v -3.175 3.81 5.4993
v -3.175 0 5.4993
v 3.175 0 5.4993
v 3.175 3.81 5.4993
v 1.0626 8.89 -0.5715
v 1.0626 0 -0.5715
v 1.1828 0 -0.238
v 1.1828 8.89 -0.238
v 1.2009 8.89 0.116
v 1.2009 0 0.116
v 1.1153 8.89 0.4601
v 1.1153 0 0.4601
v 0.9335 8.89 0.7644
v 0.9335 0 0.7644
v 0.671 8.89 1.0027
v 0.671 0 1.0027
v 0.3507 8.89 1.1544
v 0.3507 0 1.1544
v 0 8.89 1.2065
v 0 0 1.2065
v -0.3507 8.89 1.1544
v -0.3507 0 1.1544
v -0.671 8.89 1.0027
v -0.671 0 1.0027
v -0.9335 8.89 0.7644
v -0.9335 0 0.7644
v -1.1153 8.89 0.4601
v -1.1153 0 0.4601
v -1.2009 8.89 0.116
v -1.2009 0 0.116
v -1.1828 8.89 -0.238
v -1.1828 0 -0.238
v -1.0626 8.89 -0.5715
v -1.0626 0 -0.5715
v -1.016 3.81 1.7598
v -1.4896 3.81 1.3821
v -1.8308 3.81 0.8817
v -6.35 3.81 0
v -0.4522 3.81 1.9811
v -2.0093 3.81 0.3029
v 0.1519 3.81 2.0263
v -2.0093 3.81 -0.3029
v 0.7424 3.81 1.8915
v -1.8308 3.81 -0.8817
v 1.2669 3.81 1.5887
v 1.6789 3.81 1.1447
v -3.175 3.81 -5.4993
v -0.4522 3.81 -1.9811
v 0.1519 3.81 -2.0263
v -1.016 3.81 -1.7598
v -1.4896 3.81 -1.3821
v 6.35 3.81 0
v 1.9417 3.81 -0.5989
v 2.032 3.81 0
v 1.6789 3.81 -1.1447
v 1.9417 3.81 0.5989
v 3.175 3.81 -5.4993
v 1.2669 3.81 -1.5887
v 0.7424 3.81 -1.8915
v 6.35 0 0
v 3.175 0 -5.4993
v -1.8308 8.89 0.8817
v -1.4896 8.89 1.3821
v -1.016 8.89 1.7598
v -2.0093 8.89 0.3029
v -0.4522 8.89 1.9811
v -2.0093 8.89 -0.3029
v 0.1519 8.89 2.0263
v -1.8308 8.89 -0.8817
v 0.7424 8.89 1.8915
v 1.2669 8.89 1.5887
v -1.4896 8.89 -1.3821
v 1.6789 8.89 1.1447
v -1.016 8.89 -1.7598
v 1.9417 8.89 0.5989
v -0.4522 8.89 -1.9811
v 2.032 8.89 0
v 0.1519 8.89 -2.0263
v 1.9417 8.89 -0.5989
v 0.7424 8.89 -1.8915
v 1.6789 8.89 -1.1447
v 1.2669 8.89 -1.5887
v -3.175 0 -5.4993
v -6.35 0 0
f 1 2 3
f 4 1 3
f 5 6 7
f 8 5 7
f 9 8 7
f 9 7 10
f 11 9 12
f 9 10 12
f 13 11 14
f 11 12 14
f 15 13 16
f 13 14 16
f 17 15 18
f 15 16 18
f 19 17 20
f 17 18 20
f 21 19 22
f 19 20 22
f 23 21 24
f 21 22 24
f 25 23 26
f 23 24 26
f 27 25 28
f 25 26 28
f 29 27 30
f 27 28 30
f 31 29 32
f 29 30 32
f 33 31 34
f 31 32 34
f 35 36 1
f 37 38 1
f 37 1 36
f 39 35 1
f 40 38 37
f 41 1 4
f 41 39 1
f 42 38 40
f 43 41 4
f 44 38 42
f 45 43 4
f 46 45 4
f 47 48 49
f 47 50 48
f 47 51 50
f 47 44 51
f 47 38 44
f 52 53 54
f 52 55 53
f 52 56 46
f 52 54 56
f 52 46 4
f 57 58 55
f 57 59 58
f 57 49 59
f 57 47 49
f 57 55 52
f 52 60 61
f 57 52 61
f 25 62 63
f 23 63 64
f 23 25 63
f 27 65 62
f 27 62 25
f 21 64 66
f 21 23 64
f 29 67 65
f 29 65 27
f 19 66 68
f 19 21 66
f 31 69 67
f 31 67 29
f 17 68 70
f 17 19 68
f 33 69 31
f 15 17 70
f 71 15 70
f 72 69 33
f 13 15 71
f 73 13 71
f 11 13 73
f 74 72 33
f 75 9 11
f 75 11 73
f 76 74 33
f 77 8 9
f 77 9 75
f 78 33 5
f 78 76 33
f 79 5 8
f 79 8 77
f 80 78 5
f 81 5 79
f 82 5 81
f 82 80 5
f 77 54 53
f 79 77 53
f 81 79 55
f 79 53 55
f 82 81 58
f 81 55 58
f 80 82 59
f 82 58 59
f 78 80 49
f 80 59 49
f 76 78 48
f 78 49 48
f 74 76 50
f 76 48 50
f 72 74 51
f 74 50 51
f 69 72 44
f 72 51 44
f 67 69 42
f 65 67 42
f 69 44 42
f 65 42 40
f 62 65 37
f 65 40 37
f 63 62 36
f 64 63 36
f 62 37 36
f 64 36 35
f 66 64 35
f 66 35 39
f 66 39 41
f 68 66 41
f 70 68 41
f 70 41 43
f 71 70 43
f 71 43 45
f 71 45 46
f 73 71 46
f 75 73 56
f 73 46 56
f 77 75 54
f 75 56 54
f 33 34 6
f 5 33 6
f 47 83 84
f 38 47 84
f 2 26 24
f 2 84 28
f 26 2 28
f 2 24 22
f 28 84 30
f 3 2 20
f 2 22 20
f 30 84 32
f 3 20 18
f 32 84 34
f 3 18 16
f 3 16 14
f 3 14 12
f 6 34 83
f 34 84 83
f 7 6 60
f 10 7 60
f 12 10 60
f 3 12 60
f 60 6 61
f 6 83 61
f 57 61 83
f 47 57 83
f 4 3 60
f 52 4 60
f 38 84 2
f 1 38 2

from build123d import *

# Parameters (mm, degrees)
BOSS_EXTRUDE1_DEPTH = 3.81
SKETCH2_R           = 2.032
BOSS_EXTRUDE2_DEPTH = 5.08
CUT_EXTRUDE1_DEPTH  = 9.89


with BuildPart() as part:
    # Sketch1 → Boss-Extrude1 (new body)
    with BuildSketch(Plane(origin=(0, 0, 0), x_dir=(1, 0, 0), z_dir=(0, 1, 0))):
        Polygon((6.35, 0), (3.175, 5.499261314), (-3.175, 5.499261314), (-6.35, 0), (-3.175, -5.499261314), (3.175, -5.499261314), align=None)
    extrude(amount=BOSS_EXTRUDE1_DEPTH)

    # Sketch2 → Boss-Extrude2 (add)
    with BuildSketch(Plane(origin=(0, 3.81, 0), x_dir=(1, 0, 0), z_dir=(0, 1, 0))):
        Circle(SKETCH2_R)
    extrude(amount=BOSS_EXTRUDE2_DEPTH)

    # Sketch3 → Cut-Extrude1 (cut, through all)
    with BuildSketch(Plane.XZ):
        with BuildLine():
            Line((-1.062558234, -0.5715), (1.062558234, -0.5715))
            ThreePointArc((1.062558234, -0.5715), (0, 1.2065), (-1.062558234, -0.5715))
        make_face()
    extrude(amount=-CUT_EXTRUDE1_DEPTH, mode=Mode.SUBTRACT)


solid = part.part
